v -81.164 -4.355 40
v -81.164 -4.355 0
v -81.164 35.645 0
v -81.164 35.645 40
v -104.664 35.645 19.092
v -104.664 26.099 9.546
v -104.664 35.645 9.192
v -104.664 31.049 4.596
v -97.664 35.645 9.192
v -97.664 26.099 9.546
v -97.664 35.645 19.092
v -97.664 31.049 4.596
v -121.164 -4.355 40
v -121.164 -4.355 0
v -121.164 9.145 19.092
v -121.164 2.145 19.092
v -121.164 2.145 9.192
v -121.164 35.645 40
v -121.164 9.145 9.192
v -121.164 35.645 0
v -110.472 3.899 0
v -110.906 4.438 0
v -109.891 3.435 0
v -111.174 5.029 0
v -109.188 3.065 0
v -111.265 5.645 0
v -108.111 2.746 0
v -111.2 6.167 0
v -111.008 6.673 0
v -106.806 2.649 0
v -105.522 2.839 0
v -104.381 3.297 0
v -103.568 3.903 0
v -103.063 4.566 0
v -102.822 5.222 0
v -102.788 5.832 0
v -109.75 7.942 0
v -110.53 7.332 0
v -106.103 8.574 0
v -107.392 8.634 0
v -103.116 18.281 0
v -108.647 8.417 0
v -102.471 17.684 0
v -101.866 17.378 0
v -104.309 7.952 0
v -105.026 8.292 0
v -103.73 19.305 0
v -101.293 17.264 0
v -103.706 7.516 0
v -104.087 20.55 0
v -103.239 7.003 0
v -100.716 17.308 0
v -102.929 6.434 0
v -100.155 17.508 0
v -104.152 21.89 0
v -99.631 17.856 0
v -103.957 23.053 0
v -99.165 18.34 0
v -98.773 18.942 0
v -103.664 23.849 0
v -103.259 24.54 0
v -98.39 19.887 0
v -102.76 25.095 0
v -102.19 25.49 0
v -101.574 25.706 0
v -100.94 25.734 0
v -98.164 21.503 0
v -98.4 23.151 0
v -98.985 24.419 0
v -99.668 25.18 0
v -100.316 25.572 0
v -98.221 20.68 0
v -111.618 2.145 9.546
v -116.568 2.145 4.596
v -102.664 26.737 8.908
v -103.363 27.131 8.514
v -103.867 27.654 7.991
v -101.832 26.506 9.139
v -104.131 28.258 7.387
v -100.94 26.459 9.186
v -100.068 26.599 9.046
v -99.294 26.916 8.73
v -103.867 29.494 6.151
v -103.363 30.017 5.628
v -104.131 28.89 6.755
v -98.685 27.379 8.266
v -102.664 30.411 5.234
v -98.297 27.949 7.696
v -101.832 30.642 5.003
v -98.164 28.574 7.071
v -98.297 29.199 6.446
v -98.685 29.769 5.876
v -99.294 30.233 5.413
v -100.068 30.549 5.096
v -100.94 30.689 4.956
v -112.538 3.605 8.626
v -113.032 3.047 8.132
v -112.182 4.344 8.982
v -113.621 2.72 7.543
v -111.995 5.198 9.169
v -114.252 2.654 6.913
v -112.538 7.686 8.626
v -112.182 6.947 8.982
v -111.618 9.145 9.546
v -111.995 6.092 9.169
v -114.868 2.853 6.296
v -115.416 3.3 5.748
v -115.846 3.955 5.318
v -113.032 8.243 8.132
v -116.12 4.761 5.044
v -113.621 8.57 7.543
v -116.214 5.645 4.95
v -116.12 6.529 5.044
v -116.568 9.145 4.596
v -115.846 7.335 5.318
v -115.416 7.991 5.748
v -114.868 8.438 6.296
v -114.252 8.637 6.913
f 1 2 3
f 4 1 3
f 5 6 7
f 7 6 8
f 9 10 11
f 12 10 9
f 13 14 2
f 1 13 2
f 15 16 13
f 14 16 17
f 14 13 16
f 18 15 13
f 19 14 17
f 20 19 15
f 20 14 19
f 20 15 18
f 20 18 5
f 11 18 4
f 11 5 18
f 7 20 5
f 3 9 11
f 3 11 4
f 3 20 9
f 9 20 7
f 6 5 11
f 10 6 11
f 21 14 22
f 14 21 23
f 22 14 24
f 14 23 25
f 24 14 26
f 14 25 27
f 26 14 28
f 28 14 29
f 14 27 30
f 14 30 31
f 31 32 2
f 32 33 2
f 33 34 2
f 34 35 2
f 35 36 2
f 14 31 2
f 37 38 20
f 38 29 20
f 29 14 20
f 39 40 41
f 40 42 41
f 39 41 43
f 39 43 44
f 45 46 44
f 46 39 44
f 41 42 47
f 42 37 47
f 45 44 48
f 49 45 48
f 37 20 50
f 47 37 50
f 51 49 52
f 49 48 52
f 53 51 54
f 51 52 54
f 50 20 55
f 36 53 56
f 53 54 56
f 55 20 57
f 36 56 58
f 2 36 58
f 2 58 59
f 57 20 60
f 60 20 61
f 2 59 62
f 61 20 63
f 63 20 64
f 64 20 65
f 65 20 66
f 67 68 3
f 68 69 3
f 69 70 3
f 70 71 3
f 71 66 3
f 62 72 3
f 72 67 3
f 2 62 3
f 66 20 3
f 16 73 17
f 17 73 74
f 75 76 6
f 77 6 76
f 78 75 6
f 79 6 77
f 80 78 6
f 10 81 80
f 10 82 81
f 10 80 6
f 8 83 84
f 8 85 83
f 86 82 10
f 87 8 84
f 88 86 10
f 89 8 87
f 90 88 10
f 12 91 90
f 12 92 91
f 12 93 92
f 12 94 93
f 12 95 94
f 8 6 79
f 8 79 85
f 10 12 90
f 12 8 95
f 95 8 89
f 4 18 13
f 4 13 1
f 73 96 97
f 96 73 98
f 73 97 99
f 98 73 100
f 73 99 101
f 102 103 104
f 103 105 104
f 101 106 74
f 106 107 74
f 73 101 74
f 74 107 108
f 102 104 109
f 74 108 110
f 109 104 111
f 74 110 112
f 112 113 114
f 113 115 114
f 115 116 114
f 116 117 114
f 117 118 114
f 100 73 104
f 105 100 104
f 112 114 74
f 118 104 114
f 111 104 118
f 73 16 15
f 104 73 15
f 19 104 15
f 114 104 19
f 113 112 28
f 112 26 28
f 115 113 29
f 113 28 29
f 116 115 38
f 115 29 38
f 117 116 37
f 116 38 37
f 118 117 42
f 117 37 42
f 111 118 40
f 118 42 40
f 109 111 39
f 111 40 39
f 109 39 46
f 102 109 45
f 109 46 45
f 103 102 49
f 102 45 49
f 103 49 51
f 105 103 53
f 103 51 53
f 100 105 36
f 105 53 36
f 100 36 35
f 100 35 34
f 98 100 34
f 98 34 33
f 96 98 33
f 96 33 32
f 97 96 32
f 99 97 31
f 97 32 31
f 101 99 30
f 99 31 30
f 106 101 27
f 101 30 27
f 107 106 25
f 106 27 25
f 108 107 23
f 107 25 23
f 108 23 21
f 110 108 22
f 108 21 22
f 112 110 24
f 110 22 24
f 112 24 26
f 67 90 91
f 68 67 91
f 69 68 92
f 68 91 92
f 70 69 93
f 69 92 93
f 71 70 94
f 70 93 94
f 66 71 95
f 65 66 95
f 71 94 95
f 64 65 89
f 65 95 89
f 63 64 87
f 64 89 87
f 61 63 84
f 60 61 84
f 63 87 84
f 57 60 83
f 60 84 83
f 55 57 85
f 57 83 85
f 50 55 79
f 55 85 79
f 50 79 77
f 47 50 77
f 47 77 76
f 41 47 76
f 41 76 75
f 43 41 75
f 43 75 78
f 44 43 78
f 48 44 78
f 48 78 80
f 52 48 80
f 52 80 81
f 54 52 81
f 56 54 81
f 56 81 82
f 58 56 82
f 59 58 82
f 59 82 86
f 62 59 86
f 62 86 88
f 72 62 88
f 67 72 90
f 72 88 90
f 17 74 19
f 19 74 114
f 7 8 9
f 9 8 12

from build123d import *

# Parameters (mm, degrees)
ESQUISSE1_W                  = 40
ESQUISSE1_H                  = 40
BOSS_EXTRU_1_DEPTH           = 40
ESQUISSE2_R                  = 3
ENL_V_MAT_EXTRU_3_DEPTH      = 29.284271247
ENL_V_MAT_EXTRU_3_DEPTH_BACK = 29.284271247
ESQUISSE4_W                  = 7
ESQUISSE4_H                  = 7
ENL_V_MAT_EXTRU_5_DEPTH      = 23.5
ESQUISSE6_R                  = 3
ENL_V_MAT_EXTRU_6_DEPTH      = 29.284271247
ENL_V_MAT_EXTRU_6_DEPTH_BACK = 29.284271247
ESQUISSE7_W                  = 7
ESQUISSE7_H                  = 7
ENL_V_MAT_EXTRU_7_DEPTH      = 23.5


with BuildPart() as part:
    # Esquisse1 → Boss.-Extru.1 (new body)
    with BuildSketch(Plane.XY):
        with Locations((-101.164127838, 15.64516129)):
            Rectangle(ESQUISSE1_W, ESQUISSE1_H)
    extrude(amount=BOSS_EXTRU_1_DEPTH)

    # Esquisse2 → Enlèv. mat.-Extru.3 (cut, two sides)
    with BuildSketch(Plane(origin=(0, 17.822580645, 17.822580645), x_dir=(1, 0, 0), z_dir=(0, 0.707106781, 0.707106781))) as enl_v_mat_extru_3_sk:
        with Locations((-101.164127838, 15.204935265)):
            Circle(ESQUISSE2_R)
    extrude(amount=ENL_V_MAT_EXTRU_3_DEPTH, mode=Mode.SUBTRACT)
    extrude(enl_v_mat_extru_3_sk.sketch, amount=-ENL_V_MAT_EXTRU_3_DEPTH_BACK, mode=Mode.SUBTRACT)

    # Esquisse4 → Enlèv. mat.-Extru.5 (cut)
    with BuildSketch(Plane(origin=(0, 17.822580645, 17.822580645), x_dir=(1, 0, 0), z_dir=(0, 0.707106781, 0.707106781))):
        with Locations((-101.164127838, 15.204935265)):
            Rectangle(ESQUISSE4_W, ESQUISSE4_H)
    extrude(amount=ENL_V_MAT_EXTRU_5_DEPTH, mode=Mode.SUBTRACT)

    # Esquisse6 → Enlèv. mat.-Extru.6 (cut, two sides)
    with BuildSketch(Plane(origin=(-60.582063919, 0, 60.582063919), x_dir=(-0.707106781, 0, -0.707106781), z_dir=(0.707106781, 0, -0.707106781))) as enl_v_mat_extru_6_sk:
        with Locations((75.67597643, 5.64516129)):
            Circle(ESQUISSE6_R)
    extrude(amount=ENL_V_MAT_EXTRU_6_DEPTH, mode=Mode.SUBTRACT)
    extrude(enl_v_mat_extru_6_sk.sketch, amount=-ENL_V_MAT_EXTRU_6_DEPTH_BACK, mode=Mode.SUBTRACT)

    # Esquisse7 → Enlèv. mat.-Extru.7 (cut)
    with BuildSketch(Plane(origin=(-60.582063919, 0, 60.582063919), x_dir=(-0.707106781, 0, -0.707106781), z_dir=(0.707106781, 0, -0.707106781))):
        with Locations((75.67597643, 5.64516129)):
            Rectangle(ESQUISSE7_W, ESQUISSE7_H)
    extrude(amount=-ENL_V_MAT_EXTRU_7_DEPTH, mode=Mode.SUBTRACT)


solid = part.part
